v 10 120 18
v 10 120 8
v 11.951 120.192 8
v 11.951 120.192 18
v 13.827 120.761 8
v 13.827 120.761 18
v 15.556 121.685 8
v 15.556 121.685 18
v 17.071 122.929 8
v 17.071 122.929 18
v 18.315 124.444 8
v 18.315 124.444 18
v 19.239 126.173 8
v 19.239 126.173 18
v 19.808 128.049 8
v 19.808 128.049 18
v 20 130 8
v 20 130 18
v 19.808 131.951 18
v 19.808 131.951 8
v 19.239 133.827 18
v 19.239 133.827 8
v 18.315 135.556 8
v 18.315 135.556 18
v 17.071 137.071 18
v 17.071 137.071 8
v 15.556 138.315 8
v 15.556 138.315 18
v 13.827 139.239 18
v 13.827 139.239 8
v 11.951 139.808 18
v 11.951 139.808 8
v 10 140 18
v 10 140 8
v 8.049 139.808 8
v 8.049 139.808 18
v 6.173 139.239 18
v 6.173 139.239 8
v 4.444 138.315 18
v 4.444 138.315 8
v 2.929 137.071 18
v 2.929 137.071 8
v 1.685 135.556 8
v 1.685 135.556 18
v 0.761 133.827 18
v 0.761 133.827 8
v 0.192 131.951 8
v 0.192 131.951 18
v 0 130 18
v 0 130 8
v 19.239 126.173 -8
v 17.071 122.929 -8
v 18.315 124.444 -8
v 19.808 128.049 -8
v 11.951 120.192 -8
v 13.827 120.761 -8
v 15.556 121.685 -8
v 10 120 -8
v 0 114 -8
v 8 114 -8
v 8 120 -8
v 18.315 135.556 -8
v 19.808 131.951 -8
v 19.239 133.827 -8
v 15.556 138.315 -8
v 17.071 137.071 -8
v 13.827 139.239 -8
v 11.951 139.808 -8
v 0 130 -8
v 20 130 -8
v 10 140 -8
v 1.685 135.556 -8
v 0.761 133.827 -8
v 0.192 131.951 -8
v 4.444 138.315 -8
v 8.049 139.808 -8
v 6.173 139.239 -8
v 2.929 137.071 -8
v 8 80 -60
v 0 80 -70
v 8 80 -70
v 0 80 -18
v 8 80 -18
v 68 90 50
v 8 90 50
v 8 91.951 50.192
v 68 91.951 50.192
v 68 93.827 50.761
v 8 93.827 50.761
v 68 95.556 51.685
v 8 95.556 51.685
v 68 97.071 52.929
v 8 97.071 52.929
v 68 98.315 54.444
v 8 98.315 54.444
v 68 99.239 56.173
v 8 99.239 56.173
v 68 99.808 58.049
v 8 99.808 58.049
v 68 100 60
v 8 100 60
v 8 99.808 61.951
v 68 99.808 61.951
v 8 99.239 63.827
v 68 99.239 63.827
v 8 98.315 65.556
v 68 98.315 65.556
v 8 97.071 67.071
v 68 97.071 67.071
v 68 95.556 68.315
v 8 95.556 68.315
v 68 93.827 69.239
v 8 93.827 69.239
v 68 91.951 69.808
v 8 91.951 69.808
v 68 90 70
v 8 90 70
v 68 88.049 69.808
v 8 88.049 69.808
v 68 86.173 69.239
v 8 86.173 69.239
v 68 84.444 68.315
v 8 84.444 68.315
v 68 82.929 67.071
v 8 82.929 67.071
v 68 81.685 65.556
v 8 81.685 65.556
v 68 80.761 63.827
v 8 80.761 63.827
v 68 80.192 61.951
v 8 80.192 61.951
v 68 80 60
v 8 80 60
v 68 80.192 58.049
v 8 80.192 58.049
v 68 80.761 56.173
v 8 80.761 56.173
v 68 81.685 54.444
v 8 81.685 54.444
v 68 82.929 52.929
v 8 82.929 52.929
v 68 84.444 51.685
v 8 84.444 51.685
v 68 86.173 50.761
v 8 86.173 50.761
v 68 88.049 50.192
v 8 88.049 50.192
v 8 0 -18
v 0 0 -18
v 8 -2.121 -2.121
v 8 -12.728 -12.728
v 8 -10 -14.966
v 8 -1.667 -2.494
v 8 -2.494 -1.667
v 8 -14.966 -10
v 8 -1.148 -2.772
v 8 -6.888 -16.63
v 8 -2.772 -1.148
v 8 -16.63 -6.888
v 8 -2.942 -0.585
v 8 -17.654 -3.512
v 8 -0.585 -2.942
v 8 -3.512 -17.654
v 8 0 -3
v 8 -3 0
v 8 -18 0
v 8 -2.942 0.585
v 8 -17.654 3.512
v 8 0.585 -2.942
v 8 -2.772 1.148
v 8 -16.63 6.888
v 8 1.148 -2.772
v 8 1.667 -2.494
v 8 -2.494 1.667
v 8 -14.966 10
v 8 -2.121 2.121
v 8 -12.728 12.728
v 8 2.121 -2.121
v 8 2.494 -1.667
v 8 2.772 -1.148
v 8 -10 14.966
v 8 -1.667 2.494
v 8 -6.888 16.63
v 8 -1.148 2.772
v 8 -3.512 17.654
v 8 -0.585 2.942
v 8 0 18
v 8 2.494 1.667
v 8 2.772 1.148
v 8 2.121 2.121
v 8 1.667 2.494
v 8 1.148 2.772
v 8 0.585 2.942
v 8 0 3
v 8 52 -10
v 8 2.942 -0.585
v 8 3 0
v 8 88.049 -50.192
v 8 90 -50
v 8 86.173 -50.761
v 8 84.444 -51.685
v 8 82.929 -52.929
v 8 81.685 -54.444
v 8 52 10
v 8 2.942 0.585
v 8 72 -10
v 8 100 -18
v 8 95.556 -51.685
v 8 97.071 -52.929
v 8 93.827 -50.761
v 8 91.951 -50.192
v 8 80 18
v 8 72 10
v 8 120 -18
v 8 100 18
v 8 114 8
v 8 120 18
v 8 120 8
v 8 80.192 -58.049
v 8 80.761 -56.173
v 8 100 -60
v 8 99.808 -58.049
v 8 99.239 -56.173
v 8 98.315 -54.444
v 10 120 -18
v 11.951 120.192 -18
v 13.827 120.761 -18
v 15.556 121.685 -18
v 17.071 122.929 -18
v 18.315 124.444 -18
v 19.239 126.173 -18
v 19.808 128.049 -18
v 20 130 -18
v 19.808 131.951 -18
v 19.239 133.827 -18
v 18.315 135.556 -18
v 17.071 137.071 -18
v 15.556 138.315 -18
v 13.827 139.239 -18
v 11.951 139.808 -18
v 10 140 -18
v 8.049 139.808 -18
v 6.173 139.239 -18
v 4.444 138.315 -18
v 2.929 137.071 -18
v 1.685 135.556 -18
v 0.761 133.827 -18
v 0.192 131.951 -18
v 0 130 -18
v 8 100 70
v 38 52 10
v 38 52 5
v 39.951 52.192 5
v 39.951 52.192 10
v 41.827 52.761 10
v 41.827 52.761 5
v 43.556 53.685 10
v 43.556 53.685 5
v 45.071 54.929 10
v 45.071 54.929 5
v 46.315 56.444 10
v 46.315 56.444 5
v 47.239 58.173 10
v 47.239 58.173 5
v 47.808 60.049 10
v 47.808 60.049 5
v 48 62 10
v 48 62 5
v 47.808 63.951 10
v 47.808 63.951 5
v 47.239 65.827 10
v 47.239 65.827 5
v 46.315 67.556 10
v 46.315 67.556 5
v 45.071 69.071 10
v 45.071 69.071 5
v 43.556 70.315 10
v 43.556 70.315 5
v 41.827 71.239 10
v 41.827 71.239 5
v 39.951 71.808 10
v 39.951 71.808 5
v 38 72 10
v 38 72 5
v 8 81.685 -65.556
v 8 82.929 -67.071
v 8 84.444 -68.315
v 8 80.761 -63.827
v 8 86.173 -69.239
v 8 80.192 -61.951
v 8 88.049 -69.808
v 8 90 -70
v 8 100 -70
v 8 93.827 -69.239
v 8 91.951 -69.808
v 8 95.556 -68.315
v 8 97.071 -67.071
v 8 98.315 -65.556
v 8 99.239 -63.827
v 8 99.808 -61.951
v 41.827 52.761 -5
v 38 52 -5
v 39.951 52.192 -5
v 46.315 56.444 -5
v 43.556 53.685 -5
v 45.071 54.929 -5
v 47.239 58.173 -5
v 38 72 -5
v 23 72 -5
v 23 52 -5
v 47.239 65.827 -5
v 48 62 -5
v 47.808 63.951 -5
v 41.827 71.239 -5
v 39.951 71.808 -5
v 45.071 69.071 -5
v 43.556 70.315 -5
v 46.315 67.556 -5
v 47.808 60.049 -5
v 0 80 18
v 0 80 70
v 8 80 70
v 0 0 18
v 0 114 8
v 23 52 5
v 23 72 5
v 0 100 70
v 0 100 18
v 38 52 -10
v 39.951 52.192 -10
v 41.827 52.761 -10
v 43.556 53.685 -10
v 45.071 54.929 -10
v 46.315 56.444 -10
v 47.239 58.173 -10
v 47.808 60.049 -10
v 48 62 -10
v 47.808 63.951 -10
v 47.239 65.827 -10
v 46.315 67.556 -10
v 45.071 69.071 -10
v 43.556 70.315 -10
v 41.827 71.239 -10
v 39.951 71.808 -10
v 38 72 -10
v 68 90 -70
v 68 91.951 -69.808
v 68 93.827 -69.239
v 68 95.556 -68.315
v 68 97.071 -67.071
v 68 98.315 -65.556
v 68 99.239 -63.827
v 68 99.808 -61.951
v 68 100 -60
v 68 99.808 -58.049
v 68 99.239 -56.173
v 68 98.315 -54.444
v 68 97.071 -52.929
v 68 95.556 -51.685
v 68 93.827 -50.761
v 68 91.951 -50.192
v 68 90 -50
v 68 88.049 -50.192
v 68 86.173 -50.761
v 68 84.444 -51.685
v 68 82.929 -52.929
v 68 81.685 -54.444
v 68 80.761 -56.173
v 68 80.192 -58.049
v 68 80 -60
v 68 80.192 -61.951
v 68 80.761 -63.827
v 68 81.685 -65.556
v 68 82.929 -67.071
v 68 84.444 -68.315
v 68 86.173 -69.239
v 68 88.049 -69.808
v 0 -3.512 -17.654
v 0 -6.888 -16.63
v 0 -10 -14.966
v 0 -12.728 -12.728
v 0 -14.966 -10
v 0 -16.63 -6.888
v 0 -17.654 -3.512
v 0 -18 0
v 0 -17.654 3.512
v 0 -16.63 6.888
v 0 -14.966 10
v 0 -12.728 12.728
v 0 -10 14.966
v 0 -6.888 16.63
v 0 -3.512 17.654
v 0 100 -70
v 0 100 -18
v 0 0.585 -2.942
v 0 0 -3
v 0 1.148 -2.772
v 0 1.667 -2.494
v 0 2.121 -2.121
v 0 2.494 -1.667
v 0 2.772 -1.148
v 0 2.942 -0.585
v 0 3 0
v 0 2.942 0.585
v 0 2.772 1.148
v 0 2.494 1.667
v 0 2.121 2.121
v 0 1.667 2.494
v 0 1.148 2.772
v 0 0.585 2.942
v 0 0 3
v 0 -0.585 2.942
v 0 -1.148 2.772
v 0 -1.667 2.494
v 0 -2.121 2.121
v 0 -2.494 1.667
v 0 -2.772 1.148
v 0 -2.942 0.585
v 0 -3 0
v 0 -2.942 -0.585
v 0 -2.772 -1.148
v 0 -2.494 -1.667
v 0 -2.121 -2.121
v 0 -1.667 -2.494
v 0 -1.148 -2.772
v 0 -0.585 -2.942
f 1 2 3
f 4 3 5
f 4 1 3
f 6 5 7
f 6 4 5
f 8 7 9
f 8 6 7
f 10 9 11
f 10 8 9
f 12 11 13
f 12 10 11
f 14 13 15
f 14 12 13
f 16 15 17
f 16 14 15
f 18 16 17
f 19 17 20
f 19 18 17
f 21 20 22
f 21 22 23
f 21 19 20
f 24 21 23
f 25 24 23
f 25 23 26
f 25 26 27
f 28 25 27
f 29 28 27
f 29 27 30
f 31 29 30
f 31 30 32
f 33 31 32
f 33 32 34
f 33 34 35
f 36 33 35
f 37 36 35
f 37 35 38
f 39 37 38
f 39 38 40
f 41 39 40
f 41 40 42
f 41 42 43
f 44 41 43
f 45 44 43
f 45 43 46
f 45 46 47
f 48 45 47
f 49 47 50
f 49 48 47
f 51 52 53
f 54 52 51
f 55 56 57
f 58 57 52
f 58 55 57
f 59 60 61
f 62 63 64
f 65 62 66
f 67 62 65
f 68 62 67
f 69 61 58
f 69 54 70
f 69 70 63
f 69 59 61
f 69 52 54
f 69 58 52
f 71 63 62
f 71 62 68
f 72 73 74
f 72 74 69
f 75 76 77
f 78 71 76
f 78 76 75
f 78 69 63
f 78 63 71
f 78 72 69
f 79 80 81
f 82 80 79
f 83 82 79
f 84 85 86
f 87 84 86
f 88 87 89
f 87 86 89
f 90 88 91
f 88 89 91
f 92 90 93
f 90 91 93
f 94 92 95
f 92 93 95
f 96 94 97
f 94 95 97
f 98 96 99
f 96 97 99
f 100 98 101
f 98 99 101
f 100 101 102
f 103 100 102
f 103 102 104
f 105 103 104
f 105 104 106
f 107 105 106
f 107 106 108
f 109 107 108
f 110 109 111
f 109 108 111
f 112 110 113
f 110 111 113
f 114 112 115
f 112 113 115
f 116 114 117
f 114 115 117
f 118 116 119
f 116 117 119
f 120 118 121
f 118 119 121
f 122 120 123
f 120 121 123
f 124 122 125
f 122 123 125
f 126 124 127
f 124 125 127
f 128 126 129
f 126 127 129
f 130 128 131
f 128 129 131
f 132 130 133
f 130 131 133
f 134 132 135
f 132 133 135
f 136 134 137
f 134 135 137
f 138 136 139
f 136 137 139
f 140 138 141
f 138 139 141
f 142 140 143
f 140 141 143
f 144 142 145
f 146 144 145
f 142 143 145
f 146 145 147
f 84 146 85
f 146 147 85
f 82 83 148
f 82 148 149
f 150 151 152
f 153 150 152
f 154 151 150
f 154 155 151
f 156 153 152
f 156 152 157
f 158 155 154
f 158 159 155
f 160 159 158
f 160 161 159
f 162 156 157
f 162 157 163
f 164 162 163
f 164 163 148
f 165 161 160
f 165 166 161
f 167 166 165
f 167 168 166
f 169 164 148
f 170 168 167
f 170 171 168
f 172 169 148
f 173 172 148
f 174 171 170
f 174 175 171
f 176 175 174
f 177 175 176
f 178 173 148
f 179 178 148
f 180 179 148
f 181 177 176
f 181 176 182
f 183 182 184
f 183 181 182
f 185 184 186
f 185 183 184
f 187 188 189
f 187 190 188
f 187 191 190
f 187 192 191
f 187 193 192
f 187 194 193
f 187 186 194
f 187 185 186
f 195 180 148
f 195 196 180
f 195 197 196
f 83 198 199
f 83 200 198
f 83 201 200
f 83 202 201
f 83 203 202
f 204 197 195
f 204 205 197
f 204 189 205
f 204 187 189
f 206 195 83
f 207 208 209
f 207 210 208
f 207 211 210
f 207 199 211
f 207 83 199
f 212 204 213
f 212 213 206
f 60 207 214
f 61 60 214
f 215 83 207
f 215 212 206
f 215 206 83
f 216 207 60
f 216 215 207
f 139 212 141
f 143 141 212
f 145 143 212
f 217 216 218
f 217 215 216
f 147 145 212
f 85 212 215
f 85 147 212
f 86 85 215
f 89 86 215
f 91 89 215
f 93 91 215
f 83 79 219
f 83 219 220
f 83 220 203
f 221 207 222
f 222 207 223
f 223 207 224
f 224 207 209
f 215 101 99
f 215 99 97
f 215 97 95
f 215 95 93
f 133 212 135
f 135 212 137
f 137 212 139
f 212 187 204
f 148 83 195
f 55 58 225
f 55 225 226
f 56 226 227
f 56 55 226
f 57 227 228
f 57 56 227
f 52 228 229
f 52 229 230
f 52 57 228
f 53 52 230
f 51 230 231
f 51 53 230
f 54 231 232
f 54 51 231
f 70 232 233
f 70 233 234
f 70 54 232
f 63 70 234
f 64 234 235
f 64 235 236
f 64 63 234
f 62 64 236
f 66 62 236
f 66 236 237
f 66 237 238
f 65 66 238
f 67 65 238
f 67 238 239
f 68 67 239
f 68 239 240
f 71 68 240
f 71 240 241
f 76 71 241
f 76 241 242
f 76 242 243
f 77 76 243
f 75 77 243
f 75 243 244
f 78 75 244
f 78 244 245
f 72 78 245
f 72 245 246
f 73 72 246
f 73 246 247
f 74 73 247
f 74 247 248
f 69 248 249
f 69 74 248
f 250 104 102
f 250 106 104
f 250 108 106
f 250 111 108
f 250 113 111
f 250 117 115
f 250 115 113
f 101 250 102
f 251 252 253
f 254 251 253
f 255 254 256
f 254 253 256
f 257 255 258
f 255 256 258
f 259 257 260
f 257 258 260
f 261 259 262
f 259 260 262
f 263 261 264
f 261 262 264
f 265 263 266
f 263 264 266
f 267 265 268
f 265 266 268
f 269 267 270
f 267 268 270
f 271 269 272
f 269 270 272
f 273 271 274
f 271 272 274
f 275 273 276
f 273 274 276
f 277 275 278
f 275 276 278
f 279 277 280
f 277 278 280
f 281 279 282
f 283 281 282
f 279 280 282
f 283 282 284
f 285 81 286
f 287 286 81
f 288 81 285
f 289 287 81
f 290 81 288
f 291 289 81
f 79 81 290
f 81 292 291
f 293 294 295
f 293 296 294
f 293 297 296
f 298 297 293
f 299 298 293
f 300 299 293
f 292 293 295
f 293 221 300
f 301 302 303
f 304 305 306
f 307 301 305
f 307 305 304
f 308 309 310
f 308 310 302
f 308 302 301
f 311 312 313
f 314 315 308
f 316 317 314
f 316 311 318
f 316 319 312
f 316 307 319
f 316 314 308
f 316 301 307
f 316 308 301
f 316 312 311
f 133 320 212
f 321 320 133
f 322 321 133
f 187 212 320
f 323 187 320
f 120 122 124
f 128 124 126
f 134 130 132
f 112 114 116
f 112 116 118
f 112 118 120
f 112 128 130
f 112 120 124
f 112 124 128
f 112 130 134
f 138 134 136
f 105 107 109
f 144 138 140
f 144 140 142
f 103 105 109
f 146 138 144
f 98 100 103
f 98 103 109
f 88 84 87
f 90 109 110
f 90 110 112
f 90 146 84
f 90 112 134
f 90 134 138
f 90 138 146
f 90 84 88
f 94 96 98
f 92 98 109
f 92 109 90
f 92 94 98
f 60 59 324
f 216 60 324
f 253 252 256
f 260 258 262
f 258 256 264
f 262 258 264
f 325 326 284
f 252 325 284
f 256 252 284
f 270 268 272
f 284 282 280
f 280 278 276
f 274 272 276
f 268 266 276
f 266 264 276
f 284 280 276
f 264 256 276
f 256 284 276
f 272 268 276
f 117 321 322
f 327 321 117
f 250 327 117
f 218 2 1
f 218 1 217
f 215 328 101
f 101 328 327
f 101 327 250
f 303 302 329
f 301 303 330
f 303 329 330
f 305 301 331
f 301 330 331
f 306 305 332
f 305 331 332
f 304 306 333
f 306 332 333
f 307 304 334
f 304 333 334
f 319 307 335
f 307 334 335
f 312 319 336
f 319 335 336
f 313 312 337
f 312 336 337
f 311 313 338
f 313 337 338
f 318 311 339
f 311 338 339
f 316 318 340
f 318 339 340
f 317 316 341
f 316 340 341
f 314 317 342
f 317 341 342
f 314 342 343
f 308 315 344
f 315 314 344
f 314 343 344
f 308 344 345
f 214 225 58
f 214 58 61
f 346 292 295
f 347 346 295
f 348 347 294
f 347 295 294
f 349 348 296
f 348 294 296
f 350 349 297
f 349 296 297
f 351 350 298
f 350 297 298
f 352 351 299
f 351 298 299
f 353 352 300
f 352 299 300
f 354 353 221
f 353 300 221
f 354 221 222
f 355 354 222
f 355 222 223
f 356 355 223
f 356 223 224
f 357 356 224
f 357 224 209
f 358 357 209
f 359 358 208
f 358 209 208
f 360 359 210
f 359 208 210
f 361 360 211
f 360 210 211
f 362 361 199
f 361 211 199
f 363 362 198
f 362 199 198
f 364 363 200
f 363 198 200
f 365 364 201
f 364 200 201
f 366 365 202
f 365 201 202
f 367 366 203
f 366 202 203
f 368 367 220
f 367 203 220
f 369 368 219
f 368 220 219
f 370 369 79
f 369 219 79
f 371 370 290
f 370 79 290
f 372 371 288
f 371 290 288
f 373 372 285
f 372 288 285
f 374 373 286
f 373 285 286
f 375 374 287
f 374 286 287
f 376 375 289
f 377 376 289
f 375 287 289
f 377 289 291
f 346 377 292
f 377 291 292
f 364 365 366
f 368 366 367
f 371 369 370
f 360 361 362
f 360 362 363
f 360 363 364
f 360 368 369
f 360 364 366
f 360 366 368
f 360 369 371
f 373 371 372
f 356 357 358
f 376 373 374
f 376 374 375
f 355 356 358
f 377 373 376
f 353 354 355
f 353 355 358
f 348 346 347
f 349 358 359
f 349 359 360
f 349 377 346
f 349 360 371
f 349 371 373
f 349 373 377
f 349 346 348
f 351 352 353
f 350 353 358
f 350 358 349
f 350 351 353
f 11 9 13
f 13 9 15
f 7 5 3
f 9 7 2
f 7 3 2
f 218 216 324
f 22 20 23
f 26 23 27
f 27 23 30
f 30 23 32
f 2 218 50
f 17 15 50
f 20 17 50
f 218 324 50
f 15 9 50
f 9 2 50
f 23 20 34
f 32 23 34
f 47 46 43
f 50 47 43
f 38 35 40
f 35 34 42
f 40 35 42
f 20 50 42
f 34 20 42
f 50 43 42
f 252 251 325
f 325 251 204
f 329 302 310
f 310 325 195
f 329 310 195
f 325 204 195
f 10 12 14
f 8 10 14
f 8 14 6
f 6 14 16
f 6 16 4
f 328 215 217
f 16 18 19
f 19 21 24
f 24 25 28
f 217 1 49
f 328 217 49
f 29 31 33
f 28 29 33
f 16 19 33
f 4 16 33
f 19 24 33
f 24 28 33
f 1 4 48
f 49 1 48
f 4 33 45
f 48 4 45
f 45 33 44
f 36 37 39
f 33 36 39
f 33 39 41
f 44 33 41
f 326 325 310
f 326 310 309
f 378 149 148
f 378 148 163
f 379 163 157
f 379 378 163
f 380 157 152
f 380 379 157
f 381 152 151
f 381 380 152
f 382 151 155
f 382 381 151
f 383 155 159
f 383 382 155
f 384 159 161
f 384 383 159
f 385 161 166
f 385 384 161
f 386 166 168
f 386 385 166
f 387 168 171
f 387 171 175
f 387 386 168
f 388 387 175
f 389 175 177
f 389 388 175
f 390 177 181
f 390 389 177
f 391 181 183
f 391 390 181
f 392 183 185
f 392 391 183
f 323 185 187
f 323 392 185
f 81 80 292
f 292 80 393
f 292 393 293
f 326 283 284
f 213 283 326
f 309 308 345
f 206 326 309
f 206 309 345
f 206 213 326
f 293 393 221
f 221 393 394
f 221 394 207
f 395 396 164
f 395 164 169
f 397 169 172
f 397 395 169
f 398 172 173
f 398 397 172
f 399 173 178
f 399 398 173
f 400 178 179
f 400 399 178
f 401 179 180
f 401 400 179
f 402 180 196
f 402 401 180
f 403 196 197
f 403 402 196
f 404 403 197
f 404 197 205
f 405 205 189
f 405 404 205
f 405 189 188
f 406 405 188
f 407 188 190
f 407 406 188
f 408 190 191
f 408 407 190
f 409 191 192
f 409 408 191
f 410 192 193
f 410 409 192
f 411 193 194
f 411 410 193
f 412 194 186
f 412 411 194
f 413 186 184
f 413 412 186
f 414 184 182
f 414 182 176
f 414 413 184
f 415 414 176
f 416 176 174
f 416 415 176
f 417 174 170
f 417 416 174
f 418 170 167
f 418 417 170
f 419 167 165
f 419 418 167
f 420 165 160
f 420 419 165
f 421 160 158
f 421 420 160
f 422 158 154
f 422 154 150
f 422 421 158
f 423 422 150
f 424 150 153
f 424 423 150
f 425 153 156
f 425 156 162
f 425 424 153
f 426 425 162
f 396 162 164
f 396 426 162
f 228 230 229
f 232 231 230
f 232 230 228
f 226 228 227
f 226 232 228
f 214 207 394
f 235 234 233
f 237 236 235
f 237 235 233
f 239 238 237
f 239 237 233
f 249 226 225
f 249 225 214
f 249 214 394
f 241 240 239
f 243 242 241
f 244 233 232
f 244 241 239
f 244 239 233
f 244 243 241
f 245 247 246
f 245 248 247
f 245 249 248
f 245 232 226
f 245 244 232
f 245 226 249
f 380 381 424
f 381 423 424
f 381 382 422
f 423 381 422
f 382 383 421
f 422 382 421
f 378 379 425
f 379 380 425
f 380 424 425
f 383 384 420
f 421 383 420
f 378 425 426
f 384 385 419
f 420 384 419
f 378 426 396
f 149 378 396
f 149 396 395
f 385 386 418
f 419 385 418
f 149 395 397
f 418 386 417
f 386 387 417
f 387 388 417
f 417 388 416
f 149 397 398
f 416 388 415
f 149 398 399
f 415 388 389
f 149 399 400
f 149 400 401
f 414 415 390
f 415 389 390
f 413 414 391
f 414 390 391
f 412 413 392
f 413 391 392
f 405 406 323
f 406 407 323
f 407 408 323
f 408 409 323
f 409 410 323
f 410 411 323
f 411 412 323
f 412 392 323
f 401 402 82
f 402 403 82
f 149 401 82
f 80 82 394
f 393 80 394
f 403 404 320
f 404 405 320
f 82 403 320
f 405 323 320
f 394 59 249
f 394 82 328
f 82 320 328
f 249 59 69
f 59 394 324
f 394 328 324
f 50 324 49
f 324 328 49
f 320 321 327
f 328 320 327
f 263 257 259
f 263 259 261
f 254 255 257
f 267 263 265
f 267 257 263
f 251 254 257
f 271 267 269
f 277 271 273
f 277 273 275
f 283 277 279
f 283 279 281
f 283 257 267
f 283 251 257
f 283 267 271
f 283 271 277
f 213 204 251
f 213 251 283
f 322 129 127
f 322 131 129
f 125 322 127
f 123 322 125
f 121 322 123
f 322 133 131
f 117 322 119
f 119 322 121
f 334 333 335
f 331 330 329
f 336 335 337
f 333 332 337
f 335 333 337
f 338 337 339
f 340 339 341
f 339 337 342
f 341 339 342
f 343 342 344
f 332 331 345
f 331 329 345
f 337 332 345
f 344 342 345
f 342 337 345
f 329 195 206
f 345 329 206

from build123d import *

# Parameters (mm, degrees)
SKETCH_1_R          = 3
EXTRUDE_1_DEPTH     = 8
SKETCH_3_W          = 12
SKETCH_3_H          = 20
EXTRUDE_2_DEPTH     = 36
SKETCH_8_R          = 10
EXTRUDE_4_DEPTH     = 60
EXTRUDE_4_2_DEPTH   = 60
CUT_EXTRUDE_1_DEPTH = 89
SKETCH_12_W         = 8
SKETCH_12_H         = 20
EXTRUDE_5_DEPTH     = 70
SKETCH_13_W         = 16
SKETCH_13_H         = 35.268464788
CUT_EXTRUDE_2_DEPTH = 140
SKETCH_14_W         = 20
SKETCH_14_H         = 20
EXTRUDE_6_DEPTH     = 40
CUT_EXTRUDE_3_DEPTH = 40
SKETCH_16_W         = 28.583727007
SKETCH_16_H         = 28.583727007
CUT_EXTRUDE_4_DEPTH = 5


with BuildPart() as part:
    # 草图1 → 凸台-拉伸1 (new body)
    with BuildSketch(Plane(origin=(0, 0, 0), x_dir=(0, 0, -1), z_dir=(1, 0, 0))):
        with BuildLine():
            Line((-18, 0), (-18, 140))
            Line((-18, 140), (18, 140))
            Line((18, 140), (18, 0))
            ThreePointArc((18, 0), (0, -18), (-18, 0))
        make_face()
        Circle(SKETCH_1_R, mode=Mode.SUBTRACT)
    extrude(amount=EXTRUDE_1_DEPTH)

    # 草图3 → 凸台-拉伸2 (add)
    with BuildSketch(Plane(origin=(0, 0, -18), x_dir=(-1, 0, 0), z_dir=(0, 0, -1))):
        with Locations((-14, 130)):
            Rectangle(SKETCH_3_W, SKETCH_3_H)
    extrude(amount=-EXTRUDE_2_DEPTH)

    # 草图10 → 切除-拉伸1 (cut, through all)
    with BuildSketch(Plane.XY.offset(18)):
        with BuildLine():
            Line((0, 130), (-3.859245882, 130))
            Line((-3.859245882, 130), (-3.859245882, 144.839572577))
            Line((-3.859245882, 144.839572577), (22.991832782, 144.839572577))
            Line((22.991832782, 144.839572577), (22.991832782, 116.883342809))
            Line((22.991832782, 116.883342809), (10, 116.883342809))
            Line((10, 116.883342809), (10, 120))
            ThreePointArc((10, 120), (17.071067812, 137.071067812), (0, 130))
        make_face()
    extrude(amount=-CUT_EXTRUDE_1_DEPTH, mode=Mode.SUBTRACT)



with BuildPart() as body_2:
    # 草图8 → 凸台-拉伸4 (new body)
    with BuildSketch(Plane(origin=(8, 0, 0), x_dir=(0, 0, -1), z_dir=(1, 0, 0))):
        with Locations((-60, 90)):
            Circle(SKETCH_8_R)
    extrude(amount=EXTRUDE_4_DEPTH)


with BuildPart() as body_3:
    # 草图8 → Extrude 4 2 (new body)
    with BuildSketch(Plane(origin=(8, 0, 0), x_dir=(0, 0, -1), z_dir=(1, 0, 0))):
        with Locations((60, 90)):
            Circle(SKETCH_8_R)
    extrude(amount=EXTRUDE_4_2_DEPTH)


with BuildPart() as part_1:
    add(part.part)

    add(body_2.part)  # 凸台-拉伸5 merges body 2

    add(body_3.part)  # 凸台-拉伸5 merges body 3
    # 草图12 → 凸台-拉伸5 (add, symmetric)
    with BuildSketch(Plane.XY):
        with Locations((4, 90)):
            Rectangle(SKETCH_12_W, SKETCH_12_H)
    extrude(amount=EXTRUDE_5_DEPTH, both=True)

    # 草图13 → 切除-拉伸2 (cut)
    with BuildSketch(Plane.ZY):
        with Locations((0, 131.634232394)):
            Rectangle(SKETCH_13_W, SKETCH_13_H)
    extrude(amount=-CUT_EXTRUDE_2_DEPTH, mode=Mode.SUBTRACT)

    # 草图14 → 凸台-拉伸6 (add)
    with BuildSketch(Plane(origin=(8, 0, 0), x_dir=(0, 0, -1), z_dir=(1, 0, 0))):
        with Locations((0, 62)):
            Rectangle(SKETCH_14_W, SKETCH_14_H)
    extrude(amount=EXTRUDE_6_DEPTH)

    # 草图15 → 切除-拉伸3 (cut)
    with BuildSketch(Plane(origin=(0, 0, -10), x_dir=(-1, 0, 0), z_dir=(0, 0, -1))):
        with BuildLine():
            Line((-38, 72), (-54.351268728, 72))
            Line((-54.351268728, 72), (-54.351268728, 52))
            Line((-54.351268728, 52), (-38, 52))
            ThreePointArc((-38, 52), (-48, 62), (-38, 72))
        make_face()
    extrude(amount=-CUT_EXTRUDE_3_DEPTH, mode=Mode.SUBTRACT)

    # 草图16 → 切除-拉伸4 (cut, symmetric)
    with BuildSketch(Plane.XY):
        with Locations((37.291863503, 60.532166911)):
            Rectangle(SKETCH_16_W, SKETCH_16_H)
    extrude(amount=CUT_EXTRUDE_4_DEPTH, both=True, mode=Mode.SUBTRACT)


solid = part_1.part
